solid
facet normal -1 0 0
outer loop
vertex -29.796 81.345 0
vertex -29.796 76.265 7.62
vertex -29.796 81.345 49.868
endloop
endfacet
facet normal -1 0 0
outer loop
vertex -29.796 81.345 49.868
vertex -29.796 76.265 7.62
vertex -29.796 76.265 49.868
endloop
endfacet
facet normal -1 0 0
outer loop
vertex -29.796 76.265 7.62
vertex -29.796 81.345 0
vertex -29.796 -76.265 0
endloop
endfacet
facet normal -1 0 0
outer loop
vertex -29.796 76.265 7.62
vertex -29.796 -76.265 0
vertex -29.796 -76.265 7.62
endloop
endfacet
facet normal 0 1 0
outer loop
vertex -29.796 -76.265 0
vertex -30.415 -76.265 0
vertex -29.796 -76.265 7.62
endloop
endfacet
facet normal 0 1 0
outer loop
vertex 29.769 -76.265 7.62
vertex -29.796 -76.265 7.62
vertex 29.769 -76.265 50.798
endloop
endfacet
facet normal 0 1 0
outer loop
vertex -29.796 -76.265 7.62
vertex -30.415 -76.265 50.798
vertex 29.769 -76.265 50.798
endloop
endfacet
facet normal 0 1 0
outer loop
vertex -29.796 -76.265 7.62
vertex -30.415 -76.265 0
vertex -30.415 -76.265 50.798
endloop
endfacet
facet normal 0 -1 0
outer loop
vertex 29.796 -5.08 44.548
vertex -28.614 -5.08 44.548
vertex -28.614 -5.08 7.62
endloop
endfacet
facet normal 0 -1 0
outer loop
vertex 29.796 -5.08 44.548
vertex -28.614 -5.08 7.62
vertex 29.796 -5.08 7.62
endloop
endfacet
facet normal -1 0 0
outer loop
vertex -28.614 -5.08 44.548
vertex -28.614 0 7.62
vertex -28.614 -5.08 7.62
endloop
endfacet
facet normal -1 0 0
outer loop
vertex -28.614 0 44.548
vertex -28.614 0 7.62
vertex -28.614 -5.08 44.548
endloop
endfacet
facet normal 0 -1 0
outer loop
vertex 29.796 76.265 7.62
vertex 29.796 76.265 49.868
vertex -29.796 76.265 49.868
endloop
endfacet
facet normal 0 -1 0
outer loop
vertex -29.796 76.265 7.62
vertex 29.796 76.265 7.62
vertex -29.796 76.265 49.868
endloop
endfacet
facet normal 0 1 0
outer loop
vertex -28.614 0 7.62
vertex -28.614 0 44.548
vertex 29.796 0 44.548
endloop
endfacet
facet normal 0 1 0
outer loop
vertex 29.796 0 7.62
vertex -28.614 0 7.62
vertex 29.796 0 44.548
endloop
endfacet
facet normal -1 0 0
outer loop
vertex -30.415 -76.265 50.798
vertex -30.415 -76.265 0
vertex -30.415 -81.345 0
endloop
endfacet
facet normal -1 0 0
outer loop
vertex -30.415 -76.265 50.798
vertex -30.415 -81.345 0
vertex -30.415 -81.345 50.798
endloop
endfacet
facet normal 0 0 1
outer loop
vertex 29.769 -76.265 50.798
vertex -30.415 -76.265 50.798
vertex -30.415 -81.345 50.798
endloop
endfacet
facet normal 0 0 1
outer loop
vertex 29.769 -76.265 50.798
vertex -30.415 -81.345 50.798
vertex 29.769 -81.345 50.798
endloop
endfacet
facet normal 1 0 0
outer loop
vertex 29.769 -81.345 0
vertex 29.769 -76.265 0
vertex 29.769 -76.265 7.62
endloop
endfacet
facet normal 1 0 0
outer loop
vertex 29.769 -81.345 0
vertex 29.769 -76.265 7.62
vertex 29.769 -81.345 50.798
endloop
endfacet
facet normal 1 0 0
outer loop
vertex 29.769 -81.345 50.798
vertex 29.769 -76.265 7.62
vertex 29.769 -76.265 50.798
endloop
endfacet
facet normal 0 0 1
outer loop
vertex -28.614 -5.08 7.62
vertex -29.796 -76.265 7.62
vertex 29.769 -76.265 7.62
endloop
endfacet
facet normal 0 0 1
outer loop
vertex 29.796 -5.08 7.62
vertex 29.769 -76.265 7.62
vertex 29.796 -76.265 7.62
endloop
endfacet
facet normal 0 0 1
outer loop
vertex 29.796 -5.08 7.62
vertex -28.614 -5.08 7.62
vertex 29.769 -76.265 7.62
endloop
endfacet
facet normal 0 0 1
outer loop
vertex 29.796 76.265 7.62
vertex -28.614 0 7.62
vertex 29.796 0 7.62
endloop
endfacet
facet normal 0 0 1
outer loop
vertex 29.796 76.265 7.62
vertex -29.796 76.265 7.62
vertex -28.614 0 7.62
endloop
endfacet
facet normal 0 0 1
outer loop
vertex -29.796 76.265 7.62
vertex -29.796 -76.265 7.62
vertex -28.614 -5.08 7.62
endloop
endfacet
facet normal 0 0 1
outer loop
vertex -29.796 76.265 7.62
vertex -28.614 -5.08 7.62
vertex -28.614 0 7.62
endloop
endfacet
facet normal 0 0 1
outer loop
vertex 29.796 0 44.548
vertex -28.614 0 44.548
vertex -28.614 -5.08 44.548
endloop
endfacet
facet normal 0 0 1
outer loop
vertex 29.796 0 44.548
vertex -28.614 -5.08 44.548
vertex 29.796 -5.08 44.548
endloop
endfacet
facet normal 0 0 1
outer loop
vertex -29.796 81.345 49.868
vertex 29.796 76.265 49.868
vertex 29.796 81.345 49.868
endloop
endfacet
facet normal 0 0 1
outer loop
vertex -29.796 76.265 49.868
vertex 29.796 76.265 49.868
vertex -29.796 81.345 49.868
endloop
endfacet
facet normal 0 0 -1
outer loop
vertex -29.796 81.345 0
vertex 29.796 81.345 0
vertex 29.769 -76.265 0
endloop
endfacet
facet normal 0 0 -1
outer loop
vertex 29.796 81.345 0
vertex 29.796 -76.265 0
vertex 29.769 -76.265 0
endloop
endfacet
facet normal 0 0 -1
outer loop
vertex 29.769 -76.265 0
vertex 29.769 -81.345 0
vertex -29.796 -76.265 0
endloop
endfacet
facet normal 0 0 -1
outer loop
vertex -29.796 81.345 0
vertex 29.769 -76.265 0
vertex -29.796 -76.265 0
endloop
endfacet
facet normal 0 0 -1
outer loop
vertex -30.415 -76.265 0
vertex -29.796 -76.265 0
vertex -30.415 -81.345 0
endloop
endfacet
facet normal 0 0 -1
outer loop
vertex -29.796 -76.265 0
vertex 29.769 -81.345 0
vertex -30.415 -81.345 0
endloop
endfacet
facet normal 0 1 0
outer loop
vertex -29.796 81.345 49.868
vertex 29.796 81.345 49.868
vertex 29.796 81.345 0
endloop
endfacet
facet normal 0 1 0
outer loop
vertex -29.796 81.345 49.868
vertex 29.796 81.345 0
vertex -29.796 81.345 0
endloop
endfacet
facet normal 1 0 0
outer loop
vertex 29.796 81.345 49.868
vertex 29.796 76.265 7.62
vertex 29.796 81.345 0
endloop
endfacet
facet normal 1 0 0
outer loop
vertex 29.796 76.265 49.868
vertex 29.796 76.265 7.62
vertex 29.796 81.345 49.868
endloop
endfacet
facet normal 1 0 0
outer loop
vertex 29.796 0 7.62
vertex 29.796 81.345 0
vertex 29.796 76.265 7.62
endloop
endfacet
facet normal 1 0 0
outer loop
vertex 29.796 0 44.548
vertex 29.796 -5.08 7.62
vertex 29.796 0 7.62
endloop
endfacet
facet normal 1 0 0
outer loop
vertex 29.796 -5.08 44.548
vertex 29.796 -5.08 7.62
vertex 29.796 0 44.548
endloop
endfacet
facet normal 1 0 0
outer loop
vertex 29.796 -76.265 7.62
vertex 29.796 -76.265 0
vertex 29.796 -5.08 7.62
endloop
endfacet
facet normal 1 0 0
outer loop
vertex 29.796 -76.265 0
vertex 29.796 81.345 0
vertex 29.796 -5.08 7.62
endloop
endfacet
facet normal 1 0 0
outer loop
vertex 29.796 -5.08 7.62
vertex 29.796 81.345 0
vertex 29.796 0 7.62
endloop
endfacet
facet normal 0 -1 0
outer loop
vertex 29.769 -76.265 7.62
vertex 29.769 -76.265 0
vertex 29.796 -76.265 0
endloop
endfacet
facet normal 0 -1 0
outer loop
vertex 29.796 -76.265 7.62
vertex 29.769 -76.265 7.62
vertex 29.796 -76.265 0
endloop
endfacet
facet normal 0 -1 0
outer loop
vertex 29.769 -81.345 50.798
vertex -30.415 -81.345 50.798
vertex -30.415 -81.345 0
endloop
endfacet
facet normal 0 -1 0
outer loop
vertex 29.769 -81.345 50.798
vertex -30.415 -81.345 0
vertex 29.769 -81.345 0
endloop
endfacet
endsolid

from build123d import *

# Parameters (mm, degrees)
F0_W     = 59.5921203494
F0_H     = 152.5296419859
F1_DEPTH = 7.62
F3_W     = 60.1832810789
F3_H     = 50.7983006537
F4_DEPTH = 5.08
F5_W     = 58.4103576839
F5_H     = 36.9284590706
F6_DEPTH = 5.08
F7_W     = 59.5921203494
F7_H     = 49.8682297766
F8_DEPTH = 5.08


with BuildPart() as f1:
    # F0 (on Top) → F1 (new body)
    with BuildSketch(Plane.XY):
        Rectangle(F0_W, F0_H)
    extrude(amount=F1_DEPTH)

    # F3 (on offset) → F4 (join)
    with BuildSketch(Plane.XZ.offset(76.2648209929)):
        with Locations((-0.3228811547, 25.3991503268)):
            Rectangle(F3_W, F3_H)
    extrude(amount=F4_DEPTH)

    # F5 (on Front) → F6 (join)
    with BuildSketch(Plane.XZ):
        with Locations((0.5908813328, 26.0842295353)):
            Rectangle(F5_W, F5_H)
    extrude(amount=F6_DEPTH)

    # F7 (on face) → F8 (join)
    with BuildSketch(Plane(origin=(0, 76.2648209929, 0), x_dir=(-1, 0, 0), z_dir=(0, 1, 0))):
        with Locations((0, 24.9341148883)):
            Rectangle(F7_W, F7_H)
    extrude(amount=F8_DEPTH)


solid = f1.part
